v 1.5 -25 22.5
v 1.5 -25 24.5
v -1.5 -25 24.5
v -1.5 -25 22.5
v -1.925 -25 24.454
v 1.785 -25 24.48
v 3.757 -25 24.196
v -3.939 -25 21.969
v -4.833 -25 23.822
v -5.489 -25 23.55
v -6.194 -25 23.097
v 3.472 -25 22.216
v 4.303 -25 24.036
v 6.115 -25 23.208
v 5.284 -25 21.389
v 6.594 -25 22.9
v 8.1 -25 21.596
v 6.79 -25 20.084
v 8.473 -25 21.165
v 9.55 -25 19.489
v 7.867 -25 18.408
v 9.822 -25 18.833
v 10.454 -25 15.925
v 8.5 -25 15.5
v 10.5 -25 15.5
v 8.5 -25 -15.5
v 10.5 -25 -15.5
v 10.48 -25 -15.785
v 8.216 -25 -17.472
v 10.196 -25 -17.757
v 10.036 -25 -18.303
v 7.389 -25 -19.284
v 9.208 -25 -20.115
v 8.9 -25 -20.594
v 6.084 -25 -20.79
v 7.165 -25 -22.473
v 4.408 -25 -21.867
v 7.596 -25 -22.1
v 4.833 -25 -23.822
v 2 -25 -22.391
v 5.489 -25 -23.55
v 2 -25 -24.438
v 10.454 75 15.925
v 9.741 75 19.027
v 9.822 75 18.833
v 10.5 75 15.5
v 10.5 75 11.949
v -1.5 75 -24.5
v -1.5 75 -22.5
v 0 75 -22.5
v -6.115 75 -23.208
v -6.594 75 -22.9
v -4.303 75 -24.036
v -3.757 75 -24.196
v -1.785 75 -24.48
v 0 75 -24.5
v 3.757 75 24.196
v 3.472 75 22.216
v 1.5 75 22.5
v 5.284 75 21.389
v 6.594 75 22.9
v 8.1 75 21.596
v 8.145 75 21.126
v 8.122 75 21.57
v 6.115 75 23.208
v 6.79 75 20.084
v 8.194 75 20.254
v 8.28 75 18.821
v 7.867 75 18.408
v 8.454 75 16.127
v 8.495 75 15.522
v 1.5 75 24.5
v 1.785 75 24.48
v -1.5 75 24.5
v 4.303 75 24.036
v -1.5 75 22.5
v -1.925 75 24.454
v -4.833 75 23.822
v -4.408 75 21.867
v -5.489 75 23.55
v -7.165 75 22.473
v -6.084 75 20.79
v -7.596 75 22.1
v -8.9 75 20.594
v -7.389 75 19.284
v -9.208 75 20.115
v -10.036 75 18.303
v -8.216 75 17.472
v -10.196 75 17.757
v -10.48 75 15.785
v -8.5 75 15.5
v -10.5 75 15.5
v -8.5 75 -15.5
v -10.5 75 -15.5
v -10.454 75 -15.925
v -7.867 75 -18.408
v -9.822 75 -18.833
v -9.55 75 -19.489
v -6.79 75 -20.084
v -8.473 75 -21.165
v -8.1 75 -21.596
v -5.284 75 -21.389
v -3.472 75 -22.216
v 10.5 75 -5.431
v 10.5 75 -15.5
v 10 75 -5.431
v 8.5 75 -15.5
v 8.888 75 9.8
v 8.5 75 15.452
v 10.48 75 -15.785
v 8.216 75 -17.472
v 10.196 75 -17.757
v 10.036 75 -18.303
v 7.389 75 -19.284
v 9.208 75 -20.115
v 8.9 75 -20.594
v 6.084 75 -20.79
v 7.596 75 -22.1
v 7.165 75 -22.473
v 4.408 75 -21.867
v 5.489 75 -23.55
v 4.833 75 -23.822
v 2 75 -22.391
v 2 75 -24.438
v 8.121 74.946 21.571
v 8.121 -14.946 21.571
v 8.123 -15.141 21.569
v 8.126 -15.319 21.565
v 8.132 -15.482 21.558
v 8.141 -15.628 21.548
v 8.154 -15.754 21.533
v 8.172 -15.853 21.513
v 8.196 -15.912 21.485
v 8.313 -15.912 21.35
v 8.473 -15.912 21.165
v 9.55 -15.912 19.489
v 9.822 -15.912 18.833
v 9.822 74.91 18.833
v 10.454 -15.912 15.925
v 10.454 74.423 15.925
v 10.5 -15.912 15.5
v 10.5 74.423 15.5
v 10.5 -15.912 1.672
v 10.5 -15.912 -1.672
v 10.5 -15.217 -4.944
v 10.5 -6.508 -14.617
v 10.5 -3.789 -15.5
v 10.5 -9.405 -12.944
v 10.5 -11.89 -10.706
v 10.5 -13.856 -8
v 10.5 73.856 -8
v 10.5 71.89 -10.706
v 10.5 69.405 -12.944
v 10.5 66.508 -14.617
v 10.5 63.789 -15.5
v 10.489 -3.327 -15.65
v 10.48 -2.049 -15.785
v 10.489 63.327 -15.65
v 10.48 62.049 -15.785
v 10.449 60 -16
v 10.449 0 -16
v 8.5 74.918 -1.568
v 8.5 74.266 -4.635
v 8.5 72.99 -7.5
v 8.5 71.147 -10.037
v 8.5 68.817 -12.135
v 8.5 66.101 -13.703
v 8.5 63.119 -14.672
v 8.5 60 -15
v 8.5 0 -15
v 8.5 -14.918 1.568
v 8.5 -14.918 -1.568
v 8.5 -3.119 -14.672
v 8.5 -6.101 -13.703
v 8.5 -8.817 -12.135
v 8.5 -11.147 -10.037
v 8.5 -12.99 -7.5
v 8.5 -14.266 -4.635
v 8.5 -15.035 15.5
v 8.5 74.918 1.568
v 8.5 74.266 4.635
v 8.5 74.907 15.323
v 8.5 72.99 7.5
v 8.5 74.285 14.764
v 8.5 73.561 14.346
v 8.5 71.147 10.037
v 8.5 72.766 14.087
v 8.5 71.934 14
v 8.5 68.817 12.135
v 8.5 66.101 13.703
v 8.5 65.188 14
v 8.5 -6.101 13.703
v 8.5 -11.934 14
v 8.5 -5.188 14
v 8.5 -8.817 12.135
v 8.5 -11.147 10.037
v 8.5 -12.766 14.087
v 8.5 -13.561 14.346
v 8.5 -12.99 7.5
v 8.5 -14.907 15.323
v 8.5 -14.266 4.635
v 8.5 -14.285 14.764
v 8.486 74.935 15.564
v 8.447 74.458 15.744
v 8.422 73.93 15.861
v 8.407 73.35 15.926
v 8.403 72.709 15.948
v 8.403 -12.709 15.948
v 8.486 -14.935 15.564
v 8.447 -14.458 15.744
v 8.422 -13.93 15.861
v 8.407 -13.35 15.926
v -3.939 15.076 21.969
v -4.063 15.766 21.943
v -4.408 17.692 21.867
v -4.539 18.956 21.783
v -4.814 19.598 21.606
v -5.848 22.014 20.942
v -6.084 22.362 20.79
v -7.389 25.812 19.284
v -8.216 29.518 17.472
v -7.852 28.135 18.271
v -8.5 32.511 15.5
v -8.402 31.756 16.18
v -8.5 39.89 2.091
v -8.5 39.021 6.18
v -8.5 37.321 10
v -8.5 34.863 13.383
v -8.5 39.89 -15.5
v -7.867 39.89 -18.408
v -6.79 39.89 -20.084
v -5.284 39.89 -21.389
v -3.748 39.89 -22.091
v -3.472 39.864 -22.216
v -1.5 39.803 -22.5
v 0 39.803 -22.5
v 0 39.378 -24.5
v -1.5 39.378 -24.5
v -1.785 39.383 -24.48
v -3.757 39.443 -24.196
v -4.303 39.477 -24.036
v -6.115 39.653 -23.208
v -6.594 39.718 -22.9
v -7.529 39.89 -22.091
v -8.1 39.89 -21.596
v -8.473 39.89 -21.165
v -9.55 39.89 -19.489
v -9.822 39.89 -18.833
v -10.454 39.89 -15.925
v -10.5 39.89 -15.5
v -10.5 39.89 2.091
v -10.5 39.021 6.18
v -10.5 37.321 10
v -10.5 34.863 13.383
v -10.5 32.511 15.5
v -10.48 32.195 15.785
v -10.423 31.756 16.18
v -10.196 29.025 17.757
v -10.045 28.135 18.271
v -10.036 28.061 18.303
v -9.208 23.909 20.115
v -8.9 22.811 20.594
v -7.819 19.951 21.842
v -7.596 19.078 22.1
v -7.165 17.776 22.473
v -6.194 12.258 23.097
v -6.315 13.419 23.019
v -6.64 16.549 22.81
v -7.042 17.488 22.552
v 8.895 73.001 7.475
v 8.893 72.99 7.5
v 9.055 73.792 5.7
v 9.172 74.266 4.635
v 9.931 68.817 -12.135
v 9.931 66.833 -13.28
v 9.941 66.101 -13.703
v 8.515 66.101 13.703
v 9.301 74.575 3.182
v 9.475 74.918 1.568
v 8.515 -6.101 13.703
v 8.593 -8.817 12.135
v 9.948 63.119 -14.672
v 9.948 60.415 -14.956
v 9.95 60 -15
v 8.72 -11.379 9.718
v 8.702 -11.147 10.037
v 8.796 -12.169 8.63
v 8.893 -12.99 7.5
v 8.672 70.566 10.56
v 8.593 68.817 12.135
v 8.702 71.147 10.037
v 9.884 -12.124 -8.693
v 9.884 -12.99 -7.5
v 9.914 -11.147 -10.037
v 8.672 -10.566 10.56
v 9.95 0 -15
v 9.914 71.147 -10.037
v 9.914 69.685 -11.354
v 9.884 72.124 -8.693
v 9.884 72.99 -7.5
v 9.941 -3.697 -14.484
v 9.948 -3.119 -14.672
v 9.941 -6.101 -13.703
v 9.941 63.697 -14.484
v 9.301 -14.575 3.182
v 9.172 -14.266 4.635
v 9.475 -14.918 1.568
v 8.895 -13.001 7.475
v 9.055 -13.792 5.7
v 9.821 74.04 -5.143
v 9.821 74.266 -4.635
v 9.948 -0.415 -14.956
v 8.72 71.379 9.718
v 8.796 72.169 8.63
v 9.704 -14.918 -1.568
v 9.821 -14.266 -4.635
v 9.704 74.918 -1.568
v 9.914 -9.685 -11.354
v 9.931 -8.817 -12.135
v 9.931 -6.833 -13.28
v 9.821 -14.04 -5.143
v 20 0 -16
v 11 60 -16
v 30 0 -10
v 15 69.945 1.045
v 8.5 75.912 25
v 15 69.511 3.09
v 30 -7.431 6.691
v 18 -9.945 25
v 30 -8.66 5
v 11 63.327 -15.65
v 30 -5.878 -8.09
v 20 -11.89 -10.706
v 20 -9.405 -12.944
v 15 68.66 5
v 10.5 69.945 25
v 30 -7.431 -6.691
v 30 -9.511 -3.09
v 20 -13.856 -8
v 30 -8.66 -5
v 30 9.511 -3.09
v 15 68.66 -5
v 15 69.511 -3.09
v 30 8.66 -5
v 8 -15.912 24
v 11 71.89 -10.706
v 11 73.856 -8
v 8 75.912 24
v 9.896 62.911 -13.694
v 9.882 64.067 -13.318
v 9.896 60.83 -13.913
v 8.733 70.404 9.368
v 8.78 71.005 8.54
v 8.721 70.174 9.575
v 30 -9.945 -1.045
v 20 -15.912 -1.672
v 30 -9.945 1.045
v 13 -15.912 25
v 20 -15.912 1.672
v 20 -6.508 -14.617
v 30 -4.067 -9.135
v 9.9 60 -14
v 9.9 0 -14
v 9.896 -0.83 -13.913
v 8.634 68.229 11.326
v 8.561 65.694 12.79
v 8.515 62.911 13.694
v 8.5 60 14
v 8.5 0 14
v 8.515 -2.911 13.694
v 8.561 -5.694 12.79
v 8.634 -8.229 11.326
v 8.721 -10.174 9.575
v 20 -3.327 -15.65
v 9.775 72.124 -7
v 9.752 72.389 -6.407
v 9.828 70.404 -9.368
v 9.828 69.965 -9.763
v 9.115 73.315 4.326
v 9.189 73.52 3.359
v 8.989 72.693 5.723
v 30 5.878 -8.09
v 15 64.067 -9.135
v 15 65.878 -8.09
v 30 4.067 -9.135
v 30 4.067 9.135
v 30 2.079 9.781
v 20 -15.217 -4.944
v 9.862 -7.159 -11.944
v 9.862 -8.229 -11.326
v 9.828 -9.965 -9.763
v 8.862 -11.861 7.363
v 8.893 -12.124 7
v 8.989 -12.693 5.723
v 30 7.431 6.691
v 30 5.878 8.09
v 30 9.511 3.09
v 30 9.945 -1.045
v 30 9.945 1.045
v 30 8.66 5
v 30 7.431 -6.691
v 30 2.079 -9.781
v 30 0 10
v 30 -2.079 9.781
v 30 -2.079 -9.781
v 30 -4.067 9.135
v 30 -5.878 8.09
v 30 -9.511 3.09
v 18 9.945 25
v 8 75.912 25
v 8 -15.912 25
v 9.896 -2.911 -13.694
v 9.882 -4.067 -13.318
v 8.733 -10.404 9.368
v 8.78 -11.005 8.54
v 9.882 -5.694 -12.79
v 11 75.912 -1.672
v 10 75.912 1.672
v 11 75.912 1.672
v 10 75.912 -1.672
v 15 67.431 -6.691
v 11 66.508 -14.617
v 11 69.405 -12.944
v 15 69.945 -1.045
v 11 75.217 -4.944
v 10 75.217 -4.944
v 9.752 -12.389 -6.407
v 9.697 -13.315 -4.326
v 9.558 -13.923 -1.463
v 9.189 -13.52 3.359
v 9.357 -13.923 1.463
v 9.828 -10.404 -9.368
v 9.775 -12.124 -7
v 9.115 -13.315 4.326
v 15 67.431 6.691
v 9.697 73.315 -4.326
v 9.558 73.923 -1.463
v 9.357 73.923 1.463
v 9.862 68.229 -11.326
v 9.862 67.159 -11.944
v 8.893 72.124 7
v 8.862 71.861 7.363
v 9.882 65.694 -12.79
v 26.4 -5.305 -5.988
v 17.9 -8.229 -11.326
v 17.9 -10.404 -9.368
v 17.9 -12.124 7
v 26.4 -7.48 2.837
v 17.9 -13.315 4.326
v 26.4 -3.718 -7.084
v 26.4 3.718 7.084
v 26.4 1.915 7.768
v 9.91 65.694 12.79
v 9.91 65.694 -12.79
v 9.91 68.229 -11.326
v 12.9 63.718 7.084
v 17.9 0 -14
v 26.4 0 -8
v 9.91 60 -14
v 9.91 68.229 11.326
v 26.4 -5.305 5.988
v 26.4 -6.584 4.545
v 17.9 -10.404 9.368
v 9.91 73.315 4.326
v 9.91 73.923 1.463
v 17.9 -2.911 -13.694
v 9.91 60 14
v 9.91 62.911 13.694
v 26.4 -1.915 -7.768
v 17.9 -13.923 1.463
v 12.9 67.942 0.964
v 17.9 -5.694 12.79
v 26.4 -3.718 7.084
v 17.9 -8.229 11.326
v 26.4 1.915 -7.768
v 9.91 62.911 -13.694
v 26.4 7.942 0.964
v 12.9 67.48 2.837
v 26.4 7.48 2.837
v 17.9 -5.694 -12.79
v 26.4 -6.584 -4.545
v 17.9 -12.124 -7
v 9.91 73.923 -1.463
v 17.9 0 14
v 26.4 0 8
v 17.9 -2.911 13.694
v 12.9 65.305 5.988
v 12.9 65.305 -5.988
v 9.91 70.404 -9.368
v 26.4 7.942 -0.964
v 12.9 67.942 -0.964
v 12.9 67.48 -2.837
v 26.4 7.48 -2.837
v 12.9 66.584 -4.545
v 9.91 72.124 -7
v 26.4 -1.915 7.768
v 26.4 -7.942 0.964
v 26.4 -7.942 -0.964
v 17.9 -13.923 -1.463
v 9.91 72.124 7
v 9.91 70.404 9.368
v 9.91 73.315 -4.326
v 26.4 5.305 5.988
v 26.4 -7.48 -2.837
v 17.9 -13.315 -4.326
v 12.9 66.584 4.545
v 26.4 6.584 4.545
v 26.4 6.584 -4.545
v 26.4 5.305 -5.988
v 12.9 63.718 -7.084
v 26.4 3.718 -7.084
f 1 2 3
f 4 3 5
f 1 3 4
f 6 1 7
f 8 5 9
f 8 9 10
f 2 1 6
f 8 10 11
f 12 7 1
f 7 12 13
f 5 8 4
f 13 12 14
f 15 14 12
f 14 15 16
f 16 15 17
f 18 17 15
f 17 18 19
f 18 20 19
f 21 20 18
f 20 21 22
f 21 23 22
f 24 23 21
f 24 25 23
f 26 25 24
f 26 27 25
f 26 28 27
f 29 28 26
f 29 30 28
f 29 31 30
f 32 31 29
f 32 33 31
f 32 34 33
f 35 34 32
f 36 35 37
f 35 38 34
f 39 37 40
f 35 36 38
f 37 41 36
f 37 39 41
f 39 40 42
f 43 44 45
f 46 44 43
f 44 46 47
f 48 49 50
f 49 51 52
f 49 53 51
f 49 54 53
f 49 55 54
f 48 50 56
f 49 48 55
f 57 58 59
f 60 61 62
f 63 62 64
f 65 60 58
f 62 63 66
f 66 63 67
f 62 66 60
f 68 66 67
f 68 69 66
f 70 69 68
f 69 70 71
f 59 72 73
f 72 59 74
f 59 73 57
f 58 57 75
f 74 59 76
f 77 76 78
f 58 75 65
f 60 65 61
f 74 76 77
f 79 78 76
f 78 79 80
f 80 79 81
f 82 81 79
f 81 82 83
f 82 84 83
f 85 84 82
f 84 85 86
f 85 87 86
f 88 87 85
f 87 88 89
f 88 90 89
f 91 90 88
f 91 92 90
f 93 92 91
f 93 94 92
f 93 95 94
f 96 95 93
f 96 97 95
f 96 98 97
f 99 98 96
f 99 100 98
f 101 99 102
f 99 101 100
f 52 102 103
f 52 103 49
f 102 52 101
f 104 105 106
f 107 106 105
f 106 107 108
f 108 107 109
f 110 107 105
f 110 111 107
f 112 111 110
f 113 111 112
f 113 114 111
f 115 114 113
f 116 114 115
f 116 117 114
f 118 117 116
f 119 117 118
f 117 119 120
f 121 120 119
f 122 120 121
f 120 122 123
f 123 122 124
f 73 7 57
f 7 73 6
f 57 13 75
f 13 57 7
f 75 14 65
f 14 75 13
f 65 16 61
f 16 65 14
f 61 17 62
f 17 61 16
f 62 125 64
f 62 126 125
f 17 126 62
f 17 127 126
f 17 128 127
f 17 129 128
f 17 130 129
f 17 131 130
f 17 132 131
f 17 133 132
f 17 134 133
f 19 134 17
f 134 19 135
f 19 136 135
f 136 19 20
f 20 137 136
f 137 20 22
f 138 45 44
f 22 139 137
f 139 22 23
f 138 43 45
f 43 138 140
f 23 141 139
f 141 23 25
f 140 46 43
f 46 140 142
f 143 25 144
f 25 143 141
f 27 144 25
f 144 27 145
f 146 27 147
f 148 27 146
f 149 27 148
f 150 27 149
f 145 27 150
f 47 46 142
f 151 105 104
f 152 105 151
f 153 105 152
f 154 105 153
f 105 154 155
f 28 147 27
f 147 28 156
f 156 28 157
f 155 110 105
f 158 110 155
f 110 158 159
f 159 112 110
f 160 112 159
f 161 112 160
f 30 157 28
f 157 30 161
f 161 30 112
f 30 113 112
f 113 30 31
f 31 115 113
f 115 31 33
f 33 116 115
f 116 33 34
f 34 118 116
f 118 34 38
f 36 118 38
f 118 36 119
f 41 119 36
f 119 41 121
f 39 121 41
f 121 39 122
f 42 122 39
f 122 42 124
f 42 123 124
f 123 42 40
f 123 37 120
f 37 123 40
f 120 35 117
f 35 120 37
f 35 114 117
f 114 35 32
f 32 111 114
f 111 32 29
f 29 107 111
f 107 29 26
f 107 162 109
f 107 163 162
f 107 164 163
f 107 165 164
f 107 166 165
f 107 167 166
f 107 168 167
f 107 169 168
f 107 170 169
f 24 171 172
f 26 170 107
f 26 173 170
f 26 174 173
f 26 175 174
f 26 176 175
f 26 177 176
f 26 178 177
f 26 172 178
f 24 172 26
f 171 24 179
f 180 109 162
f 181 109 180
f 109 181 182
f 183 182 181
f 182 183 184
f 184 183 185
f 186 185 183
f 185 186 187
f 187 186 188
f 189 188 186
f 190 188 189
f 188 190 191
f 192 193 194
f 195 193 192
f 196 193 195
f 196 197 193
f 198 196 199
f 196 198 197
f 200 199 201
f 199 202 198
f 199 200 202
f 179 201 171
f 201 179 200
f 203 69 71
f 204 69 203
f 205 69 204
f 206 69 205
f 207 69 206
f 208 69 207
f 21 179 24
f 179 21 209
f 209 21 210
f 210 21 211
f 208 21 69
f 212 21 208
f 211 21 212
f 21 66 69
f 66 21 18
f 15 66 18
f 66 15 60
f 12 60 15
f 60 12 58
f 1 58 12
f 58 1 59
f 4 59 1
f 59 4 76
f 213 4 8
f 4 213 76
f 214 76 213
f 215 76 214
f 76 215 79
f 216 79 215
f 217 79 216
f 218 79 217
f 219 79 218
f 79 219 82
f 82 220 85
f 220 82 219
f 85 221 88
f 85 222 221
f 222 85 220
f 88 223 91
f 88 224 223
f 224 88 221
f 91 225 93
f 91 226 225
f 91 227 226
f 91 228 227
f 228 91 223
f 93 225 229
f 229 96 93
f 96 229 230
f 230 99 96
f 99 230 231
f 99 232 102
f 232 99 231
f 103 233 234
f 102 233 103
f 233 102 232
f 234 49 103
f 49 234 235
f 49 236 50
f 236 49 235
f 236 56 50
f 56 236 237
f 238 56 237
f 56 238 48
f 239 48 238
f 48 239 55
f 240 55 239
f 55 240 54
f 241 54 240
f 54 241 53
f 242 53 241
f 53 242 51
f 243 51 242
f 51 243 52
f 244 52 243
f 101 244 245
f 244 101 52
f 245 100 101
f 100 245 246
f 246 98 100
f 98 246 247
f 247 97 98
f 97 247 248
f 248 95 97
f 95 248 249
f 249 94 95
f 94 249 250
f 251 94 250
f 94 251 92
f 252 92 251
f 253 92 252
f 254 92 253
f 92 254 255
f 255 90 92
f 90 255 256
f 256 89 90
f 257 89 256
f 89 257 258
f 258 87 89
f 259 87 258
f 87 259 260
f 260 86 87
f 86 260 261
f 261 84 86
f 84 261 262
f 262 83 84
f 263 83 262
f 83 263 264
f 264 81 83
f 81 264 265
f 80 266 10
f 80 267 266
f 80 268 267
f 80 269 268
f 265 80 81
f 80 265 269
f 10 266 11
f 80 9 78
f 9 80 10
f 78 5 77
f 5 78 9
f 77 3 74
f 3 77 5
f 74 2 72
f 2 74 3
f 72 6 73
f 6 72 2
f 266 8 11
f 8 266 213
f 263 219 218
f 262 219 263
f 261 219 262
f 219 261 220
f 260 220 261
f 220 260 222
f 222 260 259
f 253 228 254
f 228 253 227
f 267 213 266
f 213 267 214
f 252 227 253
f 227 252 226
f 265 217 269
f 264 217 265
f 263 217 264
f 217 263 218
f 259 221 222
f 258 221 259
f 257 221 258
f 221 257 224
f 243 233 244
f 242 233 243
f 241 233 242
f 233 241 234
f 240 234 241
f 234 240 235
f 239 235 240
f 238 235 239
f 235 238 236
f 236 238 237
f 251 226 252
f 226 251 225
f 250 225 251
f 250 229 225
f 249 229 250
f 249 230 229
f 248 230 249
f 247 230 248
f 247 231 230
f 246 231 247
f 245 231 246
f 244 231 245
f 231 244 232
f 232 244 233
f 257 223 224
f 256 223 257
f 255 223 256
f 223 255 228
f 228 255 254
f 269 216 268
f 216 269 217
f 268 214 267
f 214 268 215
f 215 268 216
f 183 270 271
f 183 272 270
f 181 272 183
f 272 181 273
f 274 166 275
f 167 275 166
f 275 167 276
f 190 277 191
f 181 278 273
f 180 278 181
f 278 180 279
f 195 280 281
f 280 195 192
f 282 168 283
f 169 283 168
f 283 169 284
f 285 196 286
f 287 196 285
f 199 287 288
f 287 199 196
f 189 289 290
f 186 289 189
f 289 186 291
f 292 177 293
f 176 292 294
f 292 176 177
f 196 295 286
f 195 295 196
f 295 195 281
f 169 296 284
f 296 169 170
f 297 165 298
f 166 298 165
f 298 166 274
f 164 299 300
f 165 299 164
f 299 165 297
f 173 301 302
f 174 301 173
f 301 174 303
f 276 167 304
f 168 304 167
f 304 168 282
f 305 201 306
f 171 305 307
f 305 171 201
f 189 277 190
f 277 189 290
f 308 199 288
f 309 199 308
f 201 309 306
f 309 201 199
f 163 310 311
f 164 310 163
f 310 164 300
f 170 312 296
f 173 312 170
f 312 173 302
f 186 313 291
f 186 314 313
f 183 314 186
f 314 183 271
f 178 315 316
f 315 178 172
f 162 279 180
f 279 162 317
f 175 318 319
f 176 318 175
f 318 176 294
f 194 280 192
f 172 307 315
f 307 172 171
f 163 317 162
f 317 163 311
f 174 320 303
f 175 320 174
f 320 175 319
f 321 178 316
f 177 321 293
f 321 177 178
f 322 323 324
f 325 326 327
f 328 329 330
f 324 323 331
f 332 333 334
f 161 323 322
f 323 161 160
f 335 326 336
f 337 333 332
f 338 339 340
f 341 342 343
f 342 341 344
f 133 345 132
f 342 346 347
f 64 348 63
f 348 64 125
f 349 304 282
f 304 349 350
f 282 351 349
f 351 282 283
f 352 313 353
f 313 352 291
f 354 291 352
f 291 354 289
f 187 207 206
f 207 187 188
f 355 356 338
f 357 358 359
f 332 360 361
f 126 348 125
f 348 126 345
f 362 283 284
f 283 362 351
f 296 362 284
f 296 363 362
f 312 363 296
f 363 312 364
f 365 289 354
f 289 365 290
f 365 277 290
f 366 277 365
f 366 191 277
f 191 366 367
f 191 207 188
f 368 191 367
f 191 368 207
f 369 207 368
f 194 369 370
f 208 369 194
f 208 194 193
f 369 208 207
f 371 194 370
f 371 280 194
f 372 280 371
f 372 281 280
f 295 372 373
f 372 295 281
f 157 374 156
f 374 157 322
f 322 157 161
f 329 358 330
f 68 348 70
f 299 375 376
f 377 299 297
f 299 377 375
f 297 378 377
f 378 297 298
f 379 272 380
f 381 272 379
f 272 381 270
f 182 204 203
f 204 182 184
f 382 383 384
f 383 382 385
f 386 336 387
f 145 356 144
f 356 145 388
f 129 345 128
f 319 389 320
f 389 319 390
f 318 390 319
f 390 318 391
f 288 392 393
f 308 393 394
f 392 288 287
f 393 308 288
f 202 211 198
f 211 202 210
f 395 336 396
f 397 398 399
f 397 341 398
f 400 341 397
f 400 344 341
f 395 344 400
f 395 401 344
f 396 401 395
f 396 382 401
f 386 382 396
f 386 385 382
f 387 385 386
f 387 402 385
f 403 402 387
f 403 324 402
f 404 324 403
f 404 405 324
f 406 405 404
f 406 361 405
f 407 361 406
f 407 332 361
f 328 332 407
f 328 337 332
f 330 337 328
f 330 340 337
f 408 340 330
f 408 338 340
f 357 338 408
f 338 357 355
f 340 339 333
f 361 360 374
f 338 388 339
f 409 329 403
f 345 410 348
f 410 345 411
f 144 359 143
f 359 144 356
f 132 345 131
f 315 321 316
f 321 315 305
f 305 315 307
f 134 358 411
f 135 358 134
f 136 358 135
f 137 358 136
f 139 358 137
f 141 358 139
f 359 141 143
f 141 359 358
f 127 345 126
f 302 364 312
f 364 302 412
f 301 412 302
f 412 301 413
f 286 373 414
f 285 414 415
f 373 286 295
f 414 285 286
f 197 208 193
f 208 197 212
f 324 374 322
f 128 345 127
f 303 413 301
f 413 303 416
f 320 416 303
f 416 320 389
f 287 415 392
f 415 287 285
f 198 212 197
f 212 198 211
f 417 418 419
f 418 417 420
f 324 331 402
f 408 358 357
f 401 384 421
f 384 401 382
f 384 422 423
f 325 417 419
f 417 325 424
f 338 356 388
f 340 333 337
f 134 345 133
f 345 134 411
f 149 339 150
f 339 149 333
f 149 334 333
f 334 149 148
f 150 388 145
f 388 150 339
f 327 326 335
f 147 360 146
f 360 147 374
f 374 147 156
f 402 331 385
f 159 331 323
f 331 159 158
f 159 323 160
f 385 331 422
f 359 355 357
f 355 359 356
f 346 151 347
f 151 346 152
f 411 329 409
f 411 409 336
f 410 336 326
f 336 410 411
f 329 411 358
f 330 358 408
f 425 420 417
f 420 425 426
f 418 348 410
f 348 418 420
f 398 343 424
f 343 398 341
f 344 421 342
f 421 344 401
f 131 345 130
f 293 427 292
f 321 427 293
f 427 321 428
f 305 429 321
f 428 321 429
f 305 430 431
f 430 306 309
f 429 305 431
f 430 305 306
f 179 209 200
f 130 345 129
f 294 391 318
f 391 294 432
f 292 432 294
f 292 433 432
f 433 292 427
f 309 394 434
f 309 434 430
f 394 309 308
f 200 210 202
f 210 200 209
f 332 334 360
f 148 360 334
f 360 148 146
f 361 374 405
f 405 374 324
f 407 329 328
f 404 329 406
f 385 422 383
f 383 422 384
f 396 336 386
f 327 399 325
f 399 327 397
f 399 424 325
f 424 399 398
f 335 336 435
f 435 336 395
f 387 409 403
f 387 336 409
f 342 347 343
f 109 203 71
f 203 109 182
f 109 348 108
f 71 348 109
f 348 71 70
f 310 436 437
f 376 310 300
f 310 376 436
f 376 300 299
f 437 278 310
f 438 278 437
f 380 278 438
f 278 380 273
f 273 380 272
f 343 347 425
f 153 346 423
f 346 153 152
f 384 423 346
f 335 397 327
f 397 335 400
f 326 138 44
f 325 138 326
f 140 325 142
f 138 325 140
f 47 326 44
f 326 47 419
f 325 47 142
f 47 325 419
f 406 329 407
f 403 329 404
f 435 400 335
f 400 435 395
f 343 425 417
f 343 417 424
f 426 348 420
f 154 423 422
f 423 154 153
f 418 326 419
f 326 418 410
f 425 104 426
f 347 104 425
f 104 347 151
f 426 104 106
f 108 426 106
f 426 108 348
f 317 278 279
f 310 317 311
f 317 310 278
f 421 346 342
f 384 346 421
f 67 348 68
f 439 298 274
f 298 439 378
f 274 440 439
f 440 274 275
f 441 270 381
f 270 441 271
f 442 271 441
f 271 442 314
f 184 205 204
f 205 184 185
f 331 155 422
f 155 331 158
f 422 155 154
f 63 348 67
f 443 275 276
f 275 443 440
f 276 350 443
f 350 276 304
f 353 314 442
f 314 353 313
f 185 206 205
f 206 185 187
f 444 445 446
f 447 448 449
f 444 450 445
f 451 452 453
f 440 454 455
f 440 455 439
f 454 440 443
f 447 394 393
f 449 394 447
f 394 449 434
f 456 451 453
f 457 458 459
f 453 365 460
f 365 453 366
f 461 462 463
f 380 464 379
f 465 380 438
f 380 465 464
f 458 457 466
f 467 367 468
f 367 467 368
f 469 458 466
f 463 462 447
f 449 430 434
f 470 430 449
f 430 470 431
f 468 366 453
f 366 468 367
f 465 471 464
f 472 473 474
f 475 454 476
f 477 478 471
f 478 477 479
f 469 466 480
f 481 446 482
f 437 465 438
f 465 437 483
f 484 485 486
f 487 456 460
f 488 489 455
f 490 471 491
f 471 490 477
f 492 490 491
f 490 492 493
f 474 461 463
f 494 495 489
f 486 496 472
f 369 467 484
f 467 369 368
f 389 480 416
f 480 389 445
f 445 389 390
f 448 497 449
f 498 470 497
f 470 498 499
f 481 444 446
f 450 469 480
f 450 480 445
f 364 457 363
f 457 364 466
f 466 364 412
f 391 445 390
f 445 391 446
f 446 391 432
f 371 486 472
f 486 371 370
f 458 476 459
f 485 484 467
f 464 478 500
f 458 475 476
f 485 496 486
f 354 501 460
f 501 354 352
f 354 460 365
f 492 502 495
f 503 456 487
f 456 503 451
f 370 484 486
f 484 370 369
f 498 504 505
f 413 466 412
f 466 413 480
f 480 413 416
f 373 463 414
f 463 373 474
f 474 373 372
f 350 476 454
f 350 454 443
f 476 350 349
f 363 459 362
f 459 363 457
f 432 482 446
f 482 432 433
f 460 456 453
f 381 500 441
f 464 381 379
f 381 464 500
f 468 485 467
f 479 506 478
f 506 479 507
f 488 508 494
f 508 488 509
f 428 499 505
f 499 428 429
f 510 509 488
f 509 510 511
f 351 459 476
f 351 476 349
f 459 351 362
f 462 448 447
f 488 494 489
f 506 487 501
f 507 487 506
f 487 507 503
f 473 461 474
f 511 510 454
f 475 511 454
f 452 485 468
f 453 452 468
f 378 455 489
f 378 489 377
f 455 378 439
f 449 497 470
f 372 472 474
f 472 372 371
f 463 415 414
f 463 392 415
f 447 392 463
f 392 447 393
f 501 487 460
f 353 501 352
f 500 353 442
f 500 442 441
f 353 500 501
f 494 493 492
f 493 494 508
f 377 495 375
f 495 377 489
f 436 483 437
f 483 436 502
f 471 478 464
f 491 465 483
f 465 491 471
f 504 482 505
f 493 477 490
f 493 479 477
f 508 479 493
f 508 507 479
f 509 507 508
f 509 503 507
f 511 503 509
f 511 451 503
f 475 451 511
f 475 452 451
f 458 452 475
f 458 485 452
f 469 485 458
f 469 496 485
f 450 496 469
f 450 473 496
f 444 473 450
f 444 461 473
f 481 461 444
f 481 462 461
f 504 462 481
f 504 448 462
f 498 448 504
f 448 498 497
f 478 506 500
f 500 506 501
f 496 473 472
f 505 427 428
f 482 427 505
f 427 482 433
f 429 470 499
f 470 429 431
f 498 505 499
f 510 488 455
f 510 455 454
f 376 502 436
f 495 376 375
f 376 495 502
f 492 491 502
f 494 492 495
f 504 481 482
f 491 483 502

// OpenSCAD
 difference(){

translate([0,-25,0])rotate([-90])linear_extrude (convexity=100)sleve();


hull(){
translate([-20,20,0])rotate([0,90,0])cylinder(40,20,20,center=true);
translate([-20,20,-20])rotate([0,90,0])cylinder(40,20,20,center=true);
translate([-20,-30,0])rotate([0,90,0])cylinder(40,40,20,center=true);
translate([-20,-30,-20])rotate([0,90,0])cylinder(40,40,20,center=true);
}

hull(){
translate([20,0,0])rotate([0,90,0])cylinder(40,15,15,center=true);
translate([20,60,0])rotate([0,90,0])cylinder(40,15,15,center=true);
}
}

 difference(){
hull(){
translate([20,0,0])rotate([0,90,0])cylinder(20,10,10,center=true);
translate([10,0,0])rotate([0,90,0])cylinder(10,16,16);
 translate([10,60,0])rotate([0,90,0])cylinder(5,10,10);
 translate([10,60,0])rotate([0,90,0])cylinder(1,16,16);



translate([3,0,19+5]) scale([0.5,1,1])linear_extrude(1)projection(){
   hull(){
translate([20,0,0])rotate([0,90,0])cylinder(20,10,10,center=true);
translate([10,0,0])rotate([0,90,0])cylinder(10,16,16);
 translate([10,60,0])rotate([0,90,0])cylinder(5,10,10);
 translate([10,60,0])rotate([0,90,0])cylinder(1,16,16);

}
    }

}

translate([-.1,0,0])hull(){
translate([20-5,0,0])rotate([0,90,0])cylinder(18+5,8,8,center=true);
translate([10-5,0,0])rotate([0,90,0])cylinder(8+5,14,14);
 translate([10-5,60,0])rotate([0,90,0])cylinder(3+5,8,8);
 translate([10-5,60,0])rotate([0,90,0])cylinder(0.01+5,14,14);

}
}

module sleve(){
    r=7;
  difference(){
    offset(2) sleve_profile();     
      sleve_profile();
      square([2,45]);

  }
    }
    module sleve_profile(){
         r=7;
   offset(r)offset(-r) square([17,45],center=true);
        }
